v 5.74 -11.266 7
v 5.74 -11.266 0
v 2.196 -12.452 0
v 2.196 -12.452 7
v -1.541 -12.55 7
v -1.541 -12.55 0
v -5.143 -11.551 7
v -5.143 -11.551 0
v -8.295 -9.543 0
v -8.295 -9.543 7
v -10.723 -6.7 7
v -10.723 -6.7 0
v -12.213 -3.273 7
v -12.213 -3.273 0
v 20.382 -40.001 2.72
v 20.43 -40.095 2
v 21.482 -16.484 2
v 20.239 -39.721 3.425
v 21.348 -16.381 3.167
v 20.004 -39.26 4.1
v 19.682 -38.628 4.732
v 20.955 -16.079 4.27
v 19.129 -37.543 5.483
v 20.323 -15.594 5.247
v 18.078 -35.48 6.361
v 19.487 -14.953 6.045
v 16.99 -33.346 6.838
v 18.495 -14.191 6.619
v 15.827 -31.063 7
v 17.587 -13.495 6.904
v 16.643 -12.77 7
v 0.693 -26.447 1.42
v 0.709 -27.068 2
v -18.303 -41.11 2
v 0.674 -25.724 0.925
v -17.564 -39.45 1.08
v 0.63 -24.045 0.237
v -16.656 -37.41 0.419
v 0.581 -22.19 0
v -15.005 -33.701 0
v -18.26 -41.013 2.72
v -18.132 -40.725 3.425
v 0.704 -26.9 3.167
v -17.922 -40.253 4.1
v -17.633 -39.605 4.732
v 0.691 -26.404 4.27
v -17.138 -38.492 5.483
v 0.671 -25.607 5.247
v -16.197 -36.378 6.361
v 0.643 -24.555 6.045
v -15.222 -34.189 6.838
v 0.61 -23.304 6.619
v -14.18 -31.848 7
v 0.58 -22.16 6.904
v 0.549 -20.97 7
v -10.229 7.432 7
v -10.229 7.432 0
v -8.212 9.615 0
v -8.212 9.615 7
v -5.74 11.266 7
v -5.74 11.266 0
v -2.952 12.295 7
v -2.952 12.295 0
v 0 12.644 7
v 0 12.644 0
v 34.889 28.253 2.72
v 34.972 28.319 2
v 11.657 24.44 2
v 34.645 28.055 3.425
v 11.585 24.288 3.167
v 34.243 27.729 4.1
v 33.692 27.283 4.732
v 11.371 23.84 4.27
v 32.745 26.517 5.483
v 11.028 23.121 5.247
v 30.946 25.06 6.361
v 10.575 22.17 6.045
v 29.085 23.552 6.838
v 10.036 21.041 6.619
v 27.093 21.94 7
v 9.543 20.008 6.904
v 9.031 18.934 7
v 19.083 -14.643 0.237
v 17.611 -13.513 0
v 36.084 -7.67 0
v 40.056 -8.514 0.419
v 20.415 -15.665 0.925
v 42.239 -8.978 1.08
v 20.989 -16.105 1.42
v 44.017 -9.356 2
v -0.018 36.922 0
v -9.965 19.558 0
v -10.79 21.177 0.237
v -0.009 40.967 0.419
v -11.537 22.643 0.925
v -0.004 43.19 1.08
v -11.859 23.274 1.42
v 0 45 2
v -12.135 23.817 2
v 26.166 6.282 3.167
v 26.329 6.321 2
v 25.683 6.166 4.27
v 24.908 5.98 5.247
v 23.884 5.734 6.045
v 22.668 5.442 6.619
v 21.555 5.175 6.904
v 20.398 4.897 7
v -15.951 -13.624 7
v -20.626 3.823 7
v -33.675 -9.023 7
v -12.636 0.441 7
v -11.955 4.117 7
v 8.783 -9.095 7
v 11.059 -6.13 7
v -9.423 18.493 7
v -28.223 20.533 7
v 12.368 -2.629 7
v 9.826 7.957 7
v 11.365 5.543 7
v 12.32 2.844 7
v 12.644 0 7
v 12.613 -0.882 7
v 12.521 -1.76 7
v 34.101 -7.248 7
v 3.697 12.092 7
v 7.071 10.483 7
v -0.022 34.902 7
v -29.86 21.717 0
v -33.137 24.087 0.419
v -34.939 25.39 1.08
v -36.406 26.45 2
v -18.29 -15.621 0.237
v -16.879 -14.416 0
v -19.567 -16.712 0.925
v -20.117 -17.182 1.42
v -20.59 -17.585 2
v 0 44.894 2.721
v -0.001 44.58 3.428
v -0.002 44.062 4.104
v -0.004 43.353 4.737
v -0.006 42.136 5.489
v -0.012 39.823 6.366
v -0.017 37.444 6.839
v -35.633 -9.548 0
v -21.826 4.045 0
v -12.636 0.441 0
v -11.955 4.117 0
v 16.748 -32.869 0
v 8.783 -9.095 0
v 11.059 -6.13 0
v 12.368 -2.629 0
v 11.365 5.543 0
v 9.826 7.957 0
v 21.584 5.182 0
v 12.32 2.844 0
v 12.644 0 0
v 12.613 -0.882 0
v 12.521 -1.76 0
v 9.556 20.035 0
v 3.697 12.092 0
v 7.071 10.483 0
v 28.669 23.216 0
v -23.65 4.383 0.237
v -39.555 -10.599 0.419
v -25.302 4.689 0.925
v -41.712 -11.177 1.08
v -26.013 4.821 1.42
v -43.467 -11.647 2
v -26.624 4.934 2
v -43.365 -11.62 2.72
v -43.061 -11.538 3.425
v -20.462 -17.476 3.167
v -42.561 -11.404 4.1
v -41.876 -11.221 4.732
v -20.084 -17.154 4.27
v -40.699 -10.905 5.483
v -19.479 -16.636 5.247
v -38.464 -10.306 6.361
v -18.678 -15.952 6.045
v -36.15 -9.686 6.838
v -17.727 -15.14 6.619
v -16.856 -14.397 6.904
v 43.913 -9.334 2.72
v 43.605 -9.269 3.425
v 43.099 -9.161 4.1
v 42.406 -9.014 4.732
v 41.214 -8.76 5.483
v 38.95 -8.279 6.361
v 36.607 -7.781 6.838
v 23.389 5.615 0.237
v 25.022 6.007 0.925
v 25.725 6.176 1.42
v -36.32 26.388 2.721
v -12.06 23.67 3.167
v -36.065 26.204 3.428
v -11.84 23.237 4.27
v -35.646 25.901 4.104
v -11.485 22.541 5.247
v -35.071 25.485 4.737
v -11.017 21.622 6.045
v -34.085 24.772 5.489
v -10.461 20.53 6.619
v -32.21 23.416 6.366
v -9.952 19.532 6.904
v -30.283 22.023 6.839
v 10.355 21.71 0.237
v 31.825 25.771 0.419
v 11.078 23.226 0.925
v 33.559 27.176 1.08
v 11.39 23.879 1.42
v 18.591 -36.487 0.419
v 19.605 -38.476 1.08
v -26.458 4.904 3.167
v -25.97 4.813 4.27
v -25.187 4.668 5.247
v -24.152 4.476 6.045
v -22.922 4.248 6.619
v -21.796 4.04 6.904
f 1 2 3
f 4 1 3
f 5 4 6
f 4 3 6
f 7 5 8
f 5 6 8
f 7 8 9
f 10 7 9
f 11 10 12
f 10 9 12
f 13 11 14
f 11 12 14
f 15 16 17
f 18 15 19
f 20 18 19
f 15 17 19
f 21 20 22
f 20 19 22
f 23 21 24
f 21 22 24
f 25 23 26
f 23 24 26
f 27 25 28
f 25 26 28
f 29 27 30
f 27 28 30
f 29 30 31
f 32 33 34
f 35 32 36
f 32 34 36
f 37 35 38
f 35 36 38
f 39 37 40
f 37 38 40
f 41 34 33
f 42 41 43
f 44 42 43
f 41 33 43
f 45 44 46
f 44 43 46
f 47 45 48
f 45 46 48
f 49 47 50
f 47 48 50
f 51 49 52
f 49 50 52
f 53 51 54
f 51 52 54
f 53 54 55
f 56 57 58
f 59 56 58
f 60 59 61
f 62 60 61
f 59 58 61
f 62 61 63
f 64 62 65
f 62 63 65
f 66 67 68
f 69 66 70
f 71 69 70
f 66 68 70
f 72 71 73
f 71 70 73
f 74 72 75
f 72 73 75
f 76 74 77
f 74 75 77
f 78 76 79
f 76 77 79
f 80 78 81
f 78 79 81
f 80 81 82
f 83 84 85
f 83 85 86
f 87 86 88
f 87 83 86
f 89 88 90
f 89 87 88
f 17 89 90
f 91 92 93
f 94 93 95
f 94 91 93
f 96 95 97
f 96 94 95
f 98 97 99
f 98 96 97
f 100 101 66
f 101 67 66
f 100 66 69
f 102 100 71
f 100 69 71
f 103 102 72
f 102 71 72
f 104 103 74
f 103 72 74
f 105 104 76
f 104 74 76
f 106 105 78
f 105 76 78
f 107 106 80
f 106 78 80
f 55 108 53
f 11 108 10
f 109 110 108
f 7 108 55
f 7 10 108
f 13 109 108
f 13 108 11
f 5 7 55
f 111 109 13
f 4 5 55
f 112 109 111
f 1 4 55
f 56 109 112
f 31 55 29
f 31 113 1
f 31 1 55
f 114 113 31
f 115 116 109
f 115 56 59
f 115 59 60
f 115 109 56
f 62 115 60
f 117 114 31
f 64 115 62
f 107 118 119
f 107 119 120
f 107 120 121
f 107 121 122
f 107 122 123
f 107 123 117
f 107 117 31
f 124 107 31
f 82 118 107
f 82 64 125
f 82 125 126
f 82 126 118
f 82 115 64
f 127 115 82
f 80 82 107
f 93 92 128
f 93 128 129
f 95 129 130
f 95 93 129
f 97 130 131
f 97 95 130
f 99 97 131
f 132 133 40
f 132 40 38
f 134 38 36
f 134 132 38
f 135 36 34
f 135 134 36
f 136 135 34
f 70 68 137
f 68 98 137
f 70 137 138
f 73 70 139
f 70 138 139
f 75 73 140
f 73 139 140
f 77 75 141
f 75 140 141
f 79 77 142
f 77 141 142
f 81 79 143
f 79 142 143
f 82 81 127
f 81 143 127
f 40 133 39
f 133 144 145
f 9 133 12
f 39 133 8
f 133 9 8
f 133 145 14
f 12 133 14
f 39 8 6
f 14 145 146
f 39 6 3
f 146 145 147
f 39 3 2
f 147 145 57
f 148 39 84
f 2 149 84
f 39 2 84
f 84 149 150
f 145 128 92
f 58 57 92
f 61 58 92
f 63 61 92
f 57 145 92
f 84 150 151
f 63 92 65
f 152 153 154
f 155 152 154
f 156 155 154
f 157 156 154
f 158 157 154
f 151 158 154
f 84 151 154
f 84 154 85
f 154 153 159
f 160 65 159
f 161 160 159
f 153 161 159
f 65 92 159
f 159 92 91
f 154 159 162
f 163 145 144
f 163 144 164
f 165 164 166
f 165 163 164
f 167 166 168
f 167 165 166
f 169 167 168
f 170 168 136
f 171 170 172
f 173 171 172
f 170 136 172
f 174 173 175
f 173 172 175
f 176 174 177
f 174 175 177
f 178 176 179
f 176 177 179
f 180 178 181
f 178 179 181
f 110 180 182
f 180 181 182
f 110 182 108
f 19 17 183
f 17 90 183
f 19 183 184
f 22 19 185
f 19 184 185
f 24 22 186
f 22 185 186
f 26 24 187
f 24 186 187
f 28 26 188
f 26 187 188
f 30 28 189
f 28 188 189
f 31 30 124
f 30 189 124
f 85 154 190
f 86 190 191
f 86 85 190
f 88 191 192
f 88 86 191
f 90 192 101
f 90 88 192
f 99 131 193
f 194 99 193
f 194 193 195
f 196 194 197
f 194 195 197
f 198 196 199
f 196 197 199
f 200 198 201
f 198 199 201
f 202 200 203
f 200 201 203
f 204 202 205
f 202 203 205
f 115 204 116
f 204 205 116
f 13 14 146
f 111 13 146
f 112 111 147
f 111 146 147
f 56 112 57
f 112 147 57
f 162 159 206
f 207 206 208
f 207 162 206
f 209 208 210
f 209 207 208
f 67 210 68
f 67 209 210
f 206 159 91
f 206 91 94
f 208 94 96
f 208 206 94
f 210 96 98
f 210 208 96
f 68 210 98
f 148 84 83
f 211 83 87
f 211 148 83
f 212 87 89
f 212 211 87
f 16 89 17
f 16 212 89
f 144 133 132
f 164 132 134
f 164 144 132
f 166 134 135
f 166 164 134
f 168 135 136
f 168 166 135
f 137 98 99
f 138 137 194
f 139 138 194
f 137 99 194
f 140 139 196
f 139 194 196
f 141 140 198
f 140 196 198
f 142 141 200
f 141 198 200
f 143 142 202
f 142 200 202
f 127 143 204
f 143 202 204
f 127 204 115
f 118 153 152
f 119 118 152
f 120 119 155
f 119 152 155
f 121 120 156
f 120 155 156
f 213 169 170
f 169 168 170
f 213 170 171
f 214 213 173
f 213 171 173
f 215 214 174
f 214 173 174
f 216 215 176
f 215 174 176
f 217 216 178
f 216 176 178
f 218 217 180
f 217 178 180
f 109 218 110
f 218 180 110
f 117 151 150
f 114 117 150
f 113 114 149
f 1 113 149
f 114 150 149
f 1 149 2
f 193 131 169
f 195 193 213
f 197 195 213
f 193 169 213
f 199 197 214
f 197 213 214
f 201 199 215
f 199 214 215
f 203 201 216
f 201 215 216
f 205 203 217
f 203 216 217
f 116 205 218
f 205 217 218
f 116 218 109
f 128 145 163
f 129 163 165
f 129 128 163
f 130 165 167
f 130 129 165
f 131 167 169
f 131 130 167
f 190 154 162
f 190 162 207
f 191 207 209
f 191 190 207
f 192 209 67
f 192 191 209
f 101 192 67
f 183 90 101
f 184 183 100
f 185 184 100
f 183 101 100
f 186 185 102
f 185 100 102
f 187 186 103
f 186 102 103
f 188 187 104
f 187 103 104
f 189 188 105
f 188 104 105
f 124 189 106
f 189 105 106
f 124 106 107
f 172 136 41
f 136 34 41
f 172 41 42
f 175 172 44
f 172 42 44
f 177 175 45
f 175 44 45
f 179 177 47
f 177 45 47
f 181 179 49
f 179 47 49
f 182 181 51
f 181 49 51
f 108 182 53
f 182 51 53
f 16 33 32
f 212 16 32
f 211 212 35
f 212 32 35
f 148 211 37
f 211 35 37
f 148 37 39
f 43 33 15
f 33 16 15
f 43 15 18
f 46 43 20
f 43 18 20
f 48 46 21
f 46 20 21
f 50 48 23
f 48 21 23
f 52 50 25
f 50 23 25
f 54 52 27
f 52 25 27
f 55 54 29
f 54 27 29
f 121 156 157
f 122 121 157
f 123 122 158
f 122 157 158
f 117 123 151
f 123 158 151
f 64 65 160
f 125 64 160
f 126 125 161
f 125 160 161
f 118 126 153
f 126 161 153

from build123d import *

# Parameters (mm, degrees)
F1_DEPTH      = 7
F2_R          = 5
F3_T4_DEPTH   = 43.6349666374
F3_T9_DEPTH   = 43.6349666374
F3_T14_DEPTH  = 44.4129734555
F3_T19_DEPTH  = 44.4129734555
F3_T24_DEPTH  = 43.6349666396
F3_T29_DEPTH  = 43.6349666396
F3_T34_DEPTH  = 43.6349666396
F3_T39_DEPTH  = 43.6349666396
F3_T44_DEPTH  = 43.6349666396
F3_T49_DEPTH  = 43.6349666396
F3_T54_DEPTH  = 43.6349666396
F3_T59_DEPTH  = 43.6349666418
F3_T64_DEPTH  = 43.6349666418
F3_T69_DEPTH  = 43.6349666396
F3_T75_DEPTH  = 43.6349666374
F3_T79_DEPTH  = 43.6349666374
F3_T86_DEPTH  = 44.4129734555
F3_T90_DEPTH  = 44.4129734555
F3_T97_DEPTH  = 43.6349666396
F3_T101_DEPTH = 43.6349666396
F3_T108_DEPTH = 43.6349666396
F3_T112_DEPTH = 43.6349666396
F3_T119_DEPTH = 43.6349666396
F3_T123_DEPTH = 43.6349666396
F3_T130_DEPTH = 43.6349666396
F3_T134_DEPTH = 43.6349666396
F3_T141_DEPTH = 43.6349666418
F3_T145_DEPTH = 43.6349666418


# Not quite as in the source:
# - a fillet or chamfer that OpenCascade refuses, or shapes differently, is made with other operations: its cross-section is extruded or revolved along the edge and cut away or added


with BuildPart() as f1:
    # F0 (on Top) → F1 (new body)
    with BuildSketch(Plane.XY):
        Polygon((20.4295724883, -40.0952935885), (10.2147862441, -20.0476467942), (0.70880785, -27.0682797275), align=None)
        Polygon((-18.3031489384, -41.1095455939), (-9.1515744692, -20.554772797), (-20.5899370405, -17.5854675412), align=None)
        Polygon((-20.5899370405, -17.5854675412), (-21.7333310915, -5.8234285148), (-43.466662183, -11.6468570296), align=None)
        Polygon((-12.1352549156, 23.8167787844), (0, 22.5), (0, 45), align=None)
        Polygon((-43.466662183, -11.6468570296), (-21.7333310915, -5.8234285148), (-26.62414231, 4.9344931078), align=None)
        Polygon((21.4820715071, -16.4837732251), (10.2147862441, -20.0476467942), (20.4295724883, -40.0952935885), align=None)
        Polygon((-26.62414231, 4.9344931078), (-18.2028823734, 13.2251681766), (-36.4057647469, 26.4503363532), align=None)
        with BuildLine():
            Line((10.2147862441, -20.0476467942), (7.7328428868, -15.176558687))
            ThreePointArc((7.7328428868, -15.176558687), (0.4458732697, -17.0272132106), (-6.927965583, -15.5604654677))
            Line((-6.927965583, -15.5604654677), (-9.1515744692, -20.554772797))
            Line((-9.1515744692, -20.554772797), (10.2147862441, -20.0476467942))
        make_face()
        Polygon((0, 45), (0, 22.5), (11.6571894205, 24.4398058675), align=None)
        Polygon((0.70880785, -27.0682797275), (-9.1515744692, -20.554772797), (-18.3031489384, -41.1095455939), align=None)
        Polygon((-18.2028823734, 13.2251681766), (0, 22.5), (-12.1352549156, 23.8167787844), align=None)
        with BuildLine():
            Line((7.7328428868, -15.176558687), (5.7403470363, -11.2660653986))
            ThreePointArc((5.7403470363, -11.2660653986), (0.3309865905, -12.63986794), (-5.1428597844, -11.5510521989))
            Line((-5.1428597844, -11.5510521989), (-6.927965583, -15.5604654677))
            ThreePointArc((-6.927965583, -15.5604654677), (0.4458732697, -17.0272132106), (7.7328428868, -15.176558687))
        make_face()
        Polygon((34.9715682614, 28.3194176024), (17.4857841307, 14.1597088012), (26.3294034315, 6.3211305052), align=None)
        Polygon((11.6571894205, 24.4398058675), (17.4857841307, 14.1597088012), (34.9715682614, 28.3194176024), align=None)
        Polygon((0, 22.5), (17.4857841307, 14.1597088012), (11.6571894205, 24.4398058675), align=None)
        with BuildLine():
            Line((16.6608370018, -3.5413702277), (12.3678946677, -2.6288771657))
            ThreePointArc((12.3678946677, -2.6288771657), (10.0313189335, -7.6973017427), (5.7403470363, -11.2660653986))
            Line((5.7403470363, -11.2660653986), (7.7328428868, -15.176558687))
            ThreePointArc((7.7328428868, -15.176558687), (13.5132271219, -10.3690638653), (16.6608370018, -3.5413702277))
        make_face()
        Polygon((44.016642033, -9.3560260868), (22.0083210165, -4.6780130434), (21.4820715071, -16.4837732251), align=None)
        Polygon((-20.5899370405, -17.5854675412), (-9.1515744692, -20.554772797), (-21.7333310915, -5.8234285148), align=None)
        Polygon((26.3294034315, 6.3211305052), (22.0083210165, -4.6780130434), (44.016642033, -9.3560260868), align=None)
        with BuildLine():
            ThreePointArc((-12.2133600976, -3.272559975), (-12.4324724808, 2.3042225757), (-10.2293733208, 7.4320747524))
            Line((-10.2293733208, 7.4320747524), (-13.7800269253, 10.0117755983))
            ThreePointArc((-13.7800269253, 10.0117755983), (-16.7478300145, 3.1040268196), (-16.4526629065, -4.4084777391))
            Line((-16.4526629065, -4.4084777391), (-12.2133600976, -3.272559975))
        make_face()
        with BuildLine():
            ThreePointArc((-16.4526629065, -4.4084777391), (-16.7478300145, 3.1040268196), (-13.7800269253, 10.0117755983))
            Line((-13.7800269253, 10.0117755983), (-18.2028823734, 13.2251681766))
            Line((-18.2028823734, 13.2251681766), (-21.7333310915, -5.8234285148))
            Line((-21.7333310915, -5.8234285148), (-16.4526629065, -4.4084777391))
        make_face()
        Polygon((0.70880785, -27.0682797275), (10.2147862441, -20.0476467942), (-9.1515744692, -20.554772797), align=None)
        with BuildLine():
            ThreePointArc((0, 12.6442007918), (5.4434687503, 11.4124695674), (9.82638958, 7.9572533883))
            Line((9.82638958, 7.9572533883), (13.2371660261, 10.7192456959))
            ThreePointArc((13.2371660261, 10.7192456959), (7.3329170413, 15.3737802884), (0, 17.0330500114))
            Line((0, 17.0330500114), (0, 12.6442007918))
        make_face()
        Polygon((-36.4057647469, 26.4503363532), (-18.2028823734, 13.2251681766), (-12.1352549156, 23.8167787844), align=None)
        with BuildLine():
            Line((22.0083210165, -4.6780130434), (16.6608370018, -3.5413702277))
            ThreePointArc((16.6608370018, -3.5413702277), (13.5132271219, -10.3690638653), (7.7328428868, -15.176558687))
            Line((7.7328428868, -15.176558687), (10.2147862441, -20.0476467942))
            Line((10.2147862441, -20.0476467942), (22.0083210165, -4.6780130434))
        make_face()
        with BuildLine():
            ThreePointArc((-10.2293733208, 7.4320747524), (-5.7403470363, 11.2660653986), (0, 12.6442007918))
            Line((0, 12.6442007918), (0, 17.0330500114))
            ThreePointArc((0, 17.0330500114), (-7.7328428868, 15.176558687), (-13.7800269253, 10.0117755983))
            Line((-13.7800269253, 10.0117755983), (-10.2293733208, 7.4320747524))
        make_face()
        with BuildLine():
            ThreePointArc((-13.7800269253, 10.0117755983), (-7.7328428868, 15.176558687), (0, 17.0330500114))
            Line((0, 17.0330500114), (0, 22.5))
            Line((0, 22.5), (-18.2028823734, 13.2251681766))
            Line((-18.2028823734, 13.2251681766), (-13.7800269253, 10.0117755983))
        make_face()
        with BuildLine():
            ThreePointArc((9.82638958, 7.9572533883), (11.9189482877, 4.2207209547), (12.6442007918, 0))
            ThreePointArc((12.6442007918, 0), (12.5749345369, -1.321678878), (12.3678946677, -2.6288771657))
            Line((12.3678946677, -2.6288771657), (16.6608370018, -3.5413702277))
            ThreePointArc((16.6608370018, -3.5413702277), (16.9397411812, -1.7804385425), (17.0330500114, 0))
            ThreePointArc((17.0330500114, 0), (16.0560596602, 5.6857489287), (13.2371660261, 10.7192456959))
            Line((13.2371660261, 10.7192456959), (9.82638958, 7.9572533883))
        make_face()
        with BuildLine():
            Line((-9.1515744692, -20.554772797), (-6.927965583, -15.5604654677))
            ThreePointArc((-6.927965583, -15.5604654677), (-12.952032841, -11.062081087), (-16.4526629065, -4.4084777391))
            Line((-16.4526629065, -4.4084777391), (-21.7333310915, -5.8234285148))
            Line((-21.7333310915, -5.8234285148), (-9.1515744692, -20.554772797))
        make_face()
        Polygon((-21.7333310915, -5.8234285148), (-18.2028823734, 13.2251681766), (-26.62414231, 4.9344931078), align=None)
        with BuildLine():
            Line((-6.927965583, -15.5604654677), (-5.1428597844, -11.5510521989))
            ThreePointArc((-5.1428597844, -11.5510521989), (-9.6147257123, -8.2117515269), (-12.2133600976, -3.272559975))
            Line((-12.2133600976, -3.272559975), (-16.4526629065, -4.4084777391))
            ThreePointArc((-16.4526629065, -4.4084777391), (-12.952032841, -11.062081087), (-6.927965583, -15.5604654677))
        make_face()
        with BuildLine():
            Line((17.4857841307, 14.1597088012), (13.2371660261, 10.7192456959))
            ThreePointArc((13.2371660261, 10.7192456959), (16.0560596602, 5.6857489287), (17.0330500114, 0))
            ThreePointArc((17.0330500114, 0), (16.9397411812, -1.7804385425), (16.6608370018, -3.5413702277))
            Line((16.6608370018, -3.5413702277), (22.0083210165, -4.6780130434))
            Line((22.0083210165, -4.6780130434), (17.4857841307, 14.1597088012))
        make_face()
        Polygon((21.4820715071, -16.4837732251), (22.0083210165, -4.6780130434), (10.2147862441, -20.0476467942), align=None)
        Polygon((26.3294034315, 6.3211305052), (17.4857841307, 14.1597088012), (22.0083210165, -4.6780130434), align=None)
        with BuildLine():
            ThreePointArc((0, 17.0330500114), (7.3329170413, 15.3737802884), (13.2371660261, 10.7192456959))
            Line((13.2371660261, 10.7192456959), (17.4857841307, 14.1597088012))
            Line((17.4857841307, 14.1597088012), (0, 22.5))
            Line((0, 22.5), (0, 17.0330500114))
        make_face()
    extrude(amount=F1_DEPTH)

    # F2
    f2_edges = [f1.edges().sort_by_distance(p)[0] for p in [
        (-24.27051, 25.133558, 7),
        (-6.067627, 34.408389, 7),
        (5.828595, 34.719903, 7),
        (23.314379, 26.379612, 7),
        (35.173023, -1.517448, 7),
        (32.749357, -12.9199, 7),
        (20.955822, -28.289533, 7),
        (10.56919, -33.581787, 7),
        (-8.797171, -34.088913, 7),
        (-19.446543, -29.347507, 7),
        (-32.0283, -14.616162, 7),
        (-35.045402, -3.356182, 7),
        (-31.514954, 15.692415, 7),
        (30.650486, 17.320274, 7),
    ]]
    fillet(f2_edges, radius=F2_R)

    # F3: fillet of radius 5 on 14 edges, made by hand


with BuildPart() as f3_tool2:
    # F3_s3 → F3_t4 (new body)
    with BuildSketch(Plane(origin=(48.4791406288, 8.0671350572, 0), x_dir=(0, 0, 1), z_dir=(-0.9864358685, -0.1641471213, 0))):
        with BuildLine():
            ThreePointArc((0, 18.1948070403), (0.527864045, 20.4308750178), (2, 22.1948070403))
            Line((2, 22.1948070403), (1.94, 22.2748070403))
            ThreePointArc((1.94, 22.2748070403), (1, 22.2948070403), (0, 22.2948070403))
            Line((0, 22.2948070403), (-0.1, 22.1948070403))
            Line((-0.1, 22.1948070403), (-0.1, 18.1948070403))
            Line((-0.1, 18.1948070403), (0, 18.1948070403))
        make_face()
    extrude(amount=F3_T4_DEPTH)

    split(bisect_by=Plane(origin=(19.3073909721, 10.946876879, 0), x_dir=(0, 0, 1), z_dir=(0.8699057819, 0.4932179342, 0)), keep=Keep.TOP)


with BuildPart() as f1_1:
    add(f1.part)

    # F3_t1: cut F3_tool2
    add(f3_tool2.part, mode=Mode.SUBTRACT)


with BuildPart() as f3_tool7:
    # F3_s8 → F3_t9 (new body)
    with BuildSketch(Plane(origin=(-2.7180222094, 4.7938711696, 0), x_dir=(0, 0, 1), z_dir=(-0.4932179342, 0.8699057819, 0))):
        with BuildLine():
            ThreePointArc((0, 18.1948070403), (0.527864045, 20.4308750178), (2, 22.1948070403))
            Line((2, 22.1948070403), (1.94, 22.2748070403))
            ThreePointArc((1.94, 22.2748070403), (1, 22.2948070403), (0, 22.2948070403))
            Line((0, 22.2948070403), (-0.1, 22.1948070403))
            Line((-0.1, 22.1948070403), (-0.1, 18.1948070403))
            Line((-0.1, 18.1948070403), (0, 18.1948070403))
        make_face()
    extrude(amount=F3_T9_DEPTH)

    split(bisect_by=Plane(origin=(-3.6432136829, 21.893753758, 0), x_dir=(0, 0, 1), z_dir=(-0.1641471213, 0.9864358685, 0)), keep=Keep.TOP)


with BuildPart() as f1_2:
    add(f1_1.part)

    # F3_t6: cut F3_tool7
    add(f3_tool7.part, mode=Mode.SUBTRACT)


with BuildPart() as f3_tool12:
    # F3_s13 → F3_t14 (new body)
    with BuildSketch(Plane(origin=(24.3802199512, 42.5579516955, 0), x_dir=(0, 0, 1), z_dir=(-0.4970822148, -0.8677034469, 0))):
        with BuildLine():
            ThreePointArc((0, 18.368699667), (0.527864045, 20.6047676445), (2, 22.368699667))
            Line((2, 22.368699667), (1.94, 22.448699667))
            ThreePointArc((1.94, 22.448699667), (1, 22.468699667), (0, 22.468699667))
            Line((0, 22.468699667), (-0.1, 22.368699667))
            Line((-0.1, 22.368699667), (-0.1, 18.368699667))
            Line((-0.1, 18.368699667), (0, 18.368699667))
        make_face()
    extrude(amount=F3_T14_DEPTH)

    split(bisect_by=Plane(origin=(2.4130308591, 22.2381655463, 0), x_dir=(0, 0, 1), z_dir=(0.10787533, 0.9941644296, 0)), keep=Keep.TOP)


with BuildPart() as f1_3:
    add(f1_2.part)

    # F3_t11: cut F3_tool12
    add(f3_tool12.part, mode=Mode.SUBTRACT)


with BuildPart() as f3_tool17:
    # F3_s18 → F3_t19 (new body)
    with BuildSketch(Plane(origin=(-4.6066414783, 0.4998599377, 0), x_dir=(0, 0, 1), z_dir=(-0.9941644296, 0.10787533, 0))):
        with BuildLine():
            ThreePointArc((0, 18.368699667), (0.527864045, 20.6047676445), (2, 22.368699667))
            Line((2, 22.368699667), (1.94, 22.448699667))
            ThreePointArc((1.94, 22.448699667), (1, 22.468699667), (0, 22.468699667))
            Line((0, 22.468699667), (-0.1, 22.368699667))
            Line((-0.1, 22.368699667), (-0.1, 18.368699667))
            Line((-0.1, 18.368699667), (0, 18.368699667))
        make_face()
    extrude(amount=F3_T19_DEPTH)

    split(bisect_by=Plane(origin=(-19.409397803, 11.1190827731, 0), x_dir=(0, 0, 1), z_dir=(-0.8677034469, 0.4970822148, 0)), keep=Keep.TOP)


with BuildPart() as f1_4:
    add(f1_3.part)

    # F3_t16: cut F3_tool17
    add(f3_tool17.part, mode=Mode.SUBTRACT)


with BuildPart() as f3_tool22:
    # F3_s23 → F3_t24 (new body)
    with BuildSketch(Plane(origin=(-20.3395789734, 44.7393257805, 0), x_dir=(0, 0, 1), z_dir=(0.4138623331, -0.9103394802, 0))):
        with BuildLine():
            ThreePointArc((0, 18.1948070409), (0.527864045, 20.4308750184), (2, 22.1948070409))
            Line((2, 22.1948070409), (1.94, 22.2748070409))
            ThreePointArc((1.94, 22.2748070409), (1, 22.2948070409), (0, 22.2948070409))
            Line((0, 22.2948070409), (-0.1, 22.1948070409))
            Line((-0.1, 22.1948070409), (-0.1, 18.1948070409))
            Line((-0.1, 18.1948070409), (0, 18.1948070409))
        make_face()
    extrude(amount=F3_T24_DEPTH)

    split(bisect_by=Plane(origin=(-15.5709915901, 15.8162473578, 0), x_dir=(0, 0, 1), z_dir=(-0.7015601245, 0.7126102664, 0)), keep=Keep.TOP)


with BuildPart() as f1_5:
    add(f1_4.part)

    # F3_t21: cut F3_tool22
    add(f3_tool22.part, mode=Mode.SUBTRACT)


with BuildPart() as f3_tool27:
    # F3_s28 → F3_t29 (new body)
    with BuildSketch(Plane(origin=(-3.927048056, -3.8661530052, 0), x_dir=(0, 0, 1), z_dir=(-0.7126102664, -0.7015601245, 0))):
        with BuildLine():
            ThreePointArc((0, 18.1948070409), (0.527864045, 20.4308750184), (2, 22.1948070409))
            Line((2, 22.1948070409), (1.94, 22.2748070409))
            ThreePointArc((1.94, 22.2748070409), (1, 22.2948070409), (0, 22.2948070409))
            Line((0, 22.2948070409), (-0.1, 22.1948070409))
            Line((-0.1, 22.1948070409), (-0.1, 18.1948070409))
            Line((-0.1, 18.1948070409), (0, 18.1948070409))
        make_face()
    extrude(amount=F3_T29_DEPTH)

    split(bisect_by=Plane(origin=(-20.2048091048, -9.1855946253, 0), x_dir=(0, 0, 1), z_dir=(-0.9103394802, -0.4138623331, 0)), keep=Keep.TOP)


with BuildPart() as f1_6:
    add(f1_5.part)

    # F3_t26: cut F3_tool27
    add(f3_tool27.part, mode=Mode.SUBTRACT)


with BuildPart() as f3_tool32:
    # F3_s33 → F3_t34 (new body)
    with BuildSketch(Plane(origin=(-47.5690981419, 12.3485483386, 0), x_dir=(0, 0, 1), z_dir=(0.9679186559, -0.2512637569, 0))):
        with BuildLine():
            ThreePointArc((0, 18.1948070409), (0.527864045, 20.4308750184), (2, 22.1948070409))
            Line((2, 22.1948070409), (1.94, 22.2748070409))
            ThreePointArc((1.94, 22.2748070409), (1, 22.2948070409), (0, 22.2948070409))
            Line((0, 22.2948070409), (-0.1, 22.1948070409))
            Line((-0.1, 22.1948070409), (-0.1, 18.1948070409))
            Line((-0.1, 18.1948070409), (0, 18.1948070409))
        make_face()
    extrude(amount=F3_T34_DEPTH)

    split(bisect_by=Plane(origin=(-22.090675276, -2.147446258, 0), x_dir=(0, 0, 1), z_dir=(-0.9953082825, -0.0967544459, 0)), keep=Keep.TOP)


with BuildPart() as f1_7:
    add(f1_6.part)

    # F3_t31: cut F3_tool32
    add(f3_tool32.part, mode=Mode.SUBTRACT)


with BuildPart() as f3_tool37:
    # F3_s38 → F3_t39 (new body)
    with BuildSketch(Plane(origin=(0.5331937761, -5.4849384583, 0), x_dir=(0, 0, 1), z_dir=(0.0967544459, -0.9953082825, 0))):
        with BuildLine():
            ThreePointArc((0, 18.1948070409), (0.527864045, 20.4308750184), (2, 22.1948070409))
            Line((2, 22.1948070409), (1.94, 22.2748070409))
            ThreePointArc((1.94, 22.2748070409), (1, 22.2948070409), (0, 22.2948070409))
            Line((0, 22.2948070409), (-0.1, 22.1948070409))
            Line((-0.1, 22.1948070409), (-0.1, 18.1948070409))
            Line((-0.1, 18.1948070409), (0, 18.1948070409))
        make_face()
    extrude(amount=F3_T39_DEPTH)

    split(bisect_by=Plane(origin=(-5.5767506003, -21.4827677994, 0), x_dir=(0, 0, 1), z_dir=(-0.2512637569, -0.9679186559, 0)), keep=Keep.TOP)


with BuildPart() as f1_8:
    add(f1_7.part)

    # F3_t36: cut F3_tool37
    add(f3_tool37.part, mode=Mode.SUBTRACT)


with BuildPart() as f3_tool42:
    # F3_s43 → F3_t44 (new body)
    with BuildSketch(Plane(origin=(-39.5328279158, -29.1969392418, 0), x_dir=(0, 0, 1), z_dir=(0.804399561, 0.5940886687, 0))):
        with BuildLine():
            ThreePointArc((2, 22.1948070409), (0.527864045, 20.4308750184), (0, 18.1948070409))
            Line((0, 18.1948070409), (-0.1, 18.1948070409))
            Line((-0.1, 18.1948070409), (-0.1, 22.1948070409))
            Line((-0.1, 22.1948070409), (0, 22.2948070409))
            ThreePointArc((0, 22.2948070409), (1, 22.2948070409), (1.94, 22.2748070409))
            Line((1.94, 22.2748070409), (2, 22.1948070409))
        make_face()
    extrude(amount=F3_T44_DEPTH)

    split(bisect_by=Plane(origin=(-12.2332332164, -18.5191107955, 0), x_dir=(0, 0, 1), z_dir=(-0.5511754706, -0.8343893579, 0)), keep=Keep.TOP)


with BuildPart() as f1_9:
    add(f1_8.part)

    # F3_t41: cut F3_tool42
    add(f3_tool42.part, mode=Mode.SUBTRACT)


with BuildPart() as f3_tool47:
    # F3_s48 → F3_t49 (new body)
    with BuildSketch(Plane(origin=(4.5981474874, -3.0374142256, 0), x_dir=(0, 0, 1), z_dir=(0.8343893579, -0.5511754706, 0))):
        with BuildLine():
            ThreePointArc((2, 22.1948070409), (0.527864045, 20.4308750184), (0, 18.1948070409))
            Line((0, 18.1948070409), (-0.1, 18.1948070409))
            Line((-0.1, 18.1948070409), (-0.1, 22.1948070409))
            Line((-0.1, 22.1948070409), (0, 22.2948070409))
            ThreePointArc((0, 22.2948070409), (1, 22.2948070409), (1.94, 22.2748070409))
            Line((1.94, 22.2748070409), (2, 22.1948070409))
        make_face()
    extrude(amount=F3_T49_DEPTH)

    split(bisect_by=Plane(origin=(13.1856833677, -17.8534930394, 0), x_dir=(0, 0, 1), z_dir=(0.5940886687, -0.804399561, 0)), keep=Keep.TOP)


with BuildPart() as f1_10:
    add(f1_9.part)

    # F3_t46: cut F3_tool47
    add(f3_tool47.part, mode=Mode.SUBTRACT)


with BuildPart() as f3_tool52:
    # F3_s53 → F3_t54 (new body)
    with BuildSketch(Plane(origin=(5.2542221736, 1.6619250417, 0), x_dir=(0, 0, 1), z_dir=(0.9534420281, 0.3015763571, 0))):
        with BuildLine():
            ThreePointArc((0, 18.1948070409), (0.527864045, 20.4308750184), (2, 22.1948070409))
            Line((2, 22.1948070409), (1.94, 22.2748070409))
            ThreePointArc((1.94, 22.2748070409), (1, 22.2948070409), (0, 22.2948070409))
            Line((0, 22.2948070409), (-0.1, 22.1948070409))
            Line((-0.1, 22.1948070409), (-0.1, 18.1948070409))
            Line((-0.1, 18.1948070409), (0, 18.1948070409))
        make_face()
    extrude(amount=F3_T54_DEPTH)

    split(bisect_by=Plane(origin=(22.1727894267, -0.9883666429, 0), x_dir=(0, 0, 1), z_dir=(0.9990079835, -0.0445314366, 0)), keep=Keep.TOP)


with BuildPart() as f1_11:
    add(f1_10.part)

    # F3_t51: cut F3_tool52
    add(f3_tool52.part, mode=Mode.SUBTRACT)


with BuildPart() as f3_tool57:
    # F3_s58 → F3_t59 (new body)
    with BuildSketch(Plane(origin=(36.7782531622, -32.5985557719, 0), x_dir=(0, 0, 1), z_dir=(-0.7483504787, 0.663303521, 0))):
        with BuildLine():
            ThreePointArc((0, 18.1948070415), (0.527864045, 20.430875019), (2, 22.1948070415))
            Line((2, 22.1948070415), (1.94, 22.2748070415))
            ThreePointArc((1.94, 22.2748070415), (1, 22.2948070415), (0, 22.2948070415))
            Line((0, 22.2948070415), (-0.1, 22.1948070415))
            Line((-0.1, 22.1948070415), (-0.1, 18.1948070415))
            Line((-0.1, 18.1948070415), (0, 18.1948070415))
        make_face()
    extrude(amount=F3_T59_DEPTH)

    split(bisect_by=Plane(origin=(20.6578559964, -8.1155680787, 0), x_dir=(0, 0, 1), z_dir=(0.9307517726, -0.3656516618, 0)), keep=Keep.TOP)


with BuildPart() as f1_12:
    add(f1_11.part)

    # F3_t56: cut F3_tool57
    add(f3_tool57.part, mode=Mode.SUBTRACT)


with BuildPart() as f3_tool62:
    # F3_s63 → F3_t64 (new body)
    with BuildSketch(Plane(origin=(2.0150308168, 5.1291808579, 0), x_dir=(0, 0, 1), z_dir=(0.3656516618, 0.9307517726, 0))):
        with BuildLine():
            ThreePointArc((0, 18.1948070415), (0.527864045, 20.430875019), (2, 22.1948070415))
            Line((2, 22.1948070415), (1.94, 22.2748070415))
            ThreePointArc((1.94, 22.2748070415), (1, 22.2948070415), (0, 22.2948070415))
            Line((0, 22.2948070415), (-0.1, 22.1948070415))
            Line((-0.1, 22.1948070415), (-0.1, 18.1948070415))
            Line((-0.1, 18.1948070415), (0, 18.1948070415))
        make_face()
    extrude(amount=F3_T64_DEPTH)

    split(bisect_by=Plane(origin=(14.7218936583, 16.6094944752, 0), x_dir=(0, 0, 1), z_dir=(0.663303521, 0.7483504787, 0)), keep=Keep.TOP)


with BuildPart() as f1_13:
    add(f1_12.part)

    # F3_t61: cut F3_tool62
    add(f3_tool62.part, mode=Mode.SUBTRACT)


with BuildPart() as f3_tool67:
    # F3_s68 → F3_t69 (new body)
    with BuildSketch(Plane(origin=(-2.1885313046, -49.0970067808, 0), x_dir=(0, 0, 1), z_dir=(0.0445314366, 0.9990079835, 0))):
        with BuildLine():
            ThreePointArc((0, 18.1948070409), (0.527864045, 20.4308750184), (2, 22.1948070409))
            Line((2, 22.1948070409), (1.94, 22.2748070409))
            ThreePointArc((1.94, 22.2748070409), (1, 22.2948070409), (0, 22.2948070409))
            Line((0, 22.2948070409), (-0.1, 22.1948070409))
            Line((-0.1, 22.1948070409), (-0.1, 18.1948070409))
            Line((-0.1, 18.1948070409), (0, 18.1948070409))
        make_face()
    extrude(amount=F3_T69_DEPTH)

    split(bisect_by=Plane(origin=(6.6934290529, -21.1614618374, 0), x_dir=(0, 0, 1), z_dir=(0.3015763571, -0.9534420281, 0)), keep=Keep.TOP)


with BuildPart() as f1_14:
    add(f1_13.part)

    # F3_t66: cut F3_tool67
    add(f3_tool67.part, mode=Mode.SUBTRACT)


with BuildPart() as f3_tool73:
    # F3_s74 → F3_t75 (new body)
    with BuildSketch(Plane(origin=(48.4791406288, 8.0671350572, 0), x_dir=(0, 0, 1), z_dir=(-0.9864358685, -0.1641471213, 0))):
        with BuildLine():
            ThreePointArc((0, 18.1948070403), (0.527864045, 20.4308750178), (2, 22.1948070403))
            Line((2, 22.1948070403), (1.94, 22.2748070403))
            ThreePointArc((1.94, 22.2748070403), (1, 22.2948070403), (0, 22.2948070403))
            Line((0, 22.2948070403), (-0.1, 22.1948070403))
            Line((-0.1, 22.1948070403), (-0.1, 18.1948070403))
            Line((-0.1, 18.1948070403), (0, 18.1948070403))
        make_face()
    extrude(amount=F3_T75_DEPTH)

    split(bisect_by=Plane(origin=(19.3073909721, 10.946876879, 0), x_dir=(0, 0, 1), z_dir=(-0.8699057819, -0.4932179342, 0)), keep=Keep.TOP)


with BuildPart() as f3_tool77:
    # F3_s78 → F3_t79 (new body)
    with BuildSketch(Plane(origin=(-2.7180222094, 4.7938711696, 0), x_dir=(0, 0, 1), z_dir=(-0.4932179342, 0.8699057819, 0))):
        with BuildLine():
            ThreePointArc((0, 18.1948070403), (0.527864045, 20.4308750178), (2, 22.1948070403))
            Line((2, 22.1948070403), (1.94, 22.2748070403))
            ThreePointArc((1.94, 22.2748070403), (1, 22.2948070403), (0, 22.2948070403))
            Line((0, 22.2948070403), (-0.1, 22.1948070403))
            Line((-0.1, 22.1948070403), (-0.1, 18.1948070403))
            Line((-0.1, 18.1948070403), (0, 18.1948070403))
        make_face()
    extrude(amount=F3_T79_DEPTH)

    split(bisect_by=Plane(origin=(-3.6432136829, 21.893753758, 0), x_dir=(0, 0, 1), z_dir=(0.1641471213, -0.9864358685, 0)), keep=Keep.TOP)


with BuildPart() as f3_tool73_1:
    add(f3_tool73.part)

    # F3_t81: intersect F3_tool77
    add(f3_tool77.part, mode=Mode.INTERSECT)


with BuildPart() as f1_15:
    add(f1_14.part)

    # F3_t71: cut F3_tool73
    add(f3_tool73_1.part, mode=Mode.SUBTRACT)


with BuildPart() as f3_tool84:
    # F3_s85 → F3_t86 (new body)
    with BuildSketch(Plane(origin=(24.3802199512, 42.5579516955, 0), x_dir=(0, 0, 1), z_dir=(-0.4970822148, -0.8677034469, 0))):
        with BuildLine():
            ThreePointArc((0, 18.368699667), (0.527864045, 20.6047676445), (2, 22.368699667))
            Line((2, 22.368699667), (1.94, 22.448699667))
            ThreePointArc((1.94, 22.448699667), (1, 22.468699667), (0, 22.468699667))
            Line((0, 22.468699667), (-0.1, 22.368699667))
            Line((-0.1, 22.368699667), (-0.1, 18.368699667))
            Line((-0.1, 18.368699667), (0, 18.368699667))
        make_face()
    extrude(amount=F3_T86_DEPTH)

    split(bisect_by=Plane(origin=(2.4130308591, 22.2381655463, 0), x_dir=(0, 0, 1), z_dir=(-0.10787533, -0.9941644296, 0)), keep=Keep.TOP)


with BuildPart() as f3_tool88:
    # F3_s89 → F3_t90 (new body)
    with BuildSketch(Plane(origin=(-4.6066414783, 0.4998599377, 0), x_dir=(0, 0, 1), z_dir=(-0.9941644296, 0.10787533, 0))):
        with BuildLine():
            ThreePointArc((0, 18.368699667), (0.527864045, 20.6047676445), (2, 22.368699667))
            Line((2, 22.368699667), (1.94, 22.448699667))
            ThreePointArc((1.94, 22.448699667), (1, 22.468699667), (0, 22.468699667))
            Line((0, 22.468699667), (-0.1, 22.368699667))
            Line((-0.1, 22.368699667), (-0.1, 18.368699667))
            Line((-0.1, 18.368699667), (0, 18.368699667))
        make_face()
    extrude(amount=F3_T90_DEPTH)

    split(bisect_by=Plane(origin=(-19.409397803, 11.1190827731, 0), x_dir=(0, 0, 1), z_dir=(0.8677034469, -0.4970822148, 0)), keep=Keep.TOP)


with BuildPart() as f3_tool84_1:
    add(f3_tool84.part)

    # F3_t92: intersect F3_tool88
    add(f3_tool88.part, mode=Mode.INTERSECT)


with BuildPart() as f1_16:
    add(f1_15.part)

    # F3_t82: cut F3_tool84
    add(f3_tool84_1.part, mode=Mode.SUBTRACT)


with BuildPart() as f3_tool95:
    # F3_s96 → F3_t97 (new body)
    with BuildSketch(Plane(origin=(-20.3395789734, 44.7393257805, 0), x_dir=(0, 0, 1), z_dir=(0.4138623331, -0.9103394802, 0))):
        with BuildLine():
            ThreePointArc((0, 18.1948070409), (0.527864045, 20.4308750184), (2, 22.1948070409))
            Line((2, 22.1948070409), (1.94, 22.2748070409))
            ThreePointArc((1.94, 22.2748070409), (1, 22.2948070409), (0, 22.2948070409))
            Line((0, 22.2948070409), (-0.1, 22.1948070409))
            Line((-0.1, 22.1948070409), (-0.1, 18.1948070409))
            Line((-0.1, 18.1948070409), (0, 18.1948070409))
        make_face()
    extrude(amount=F3_T97_DEPTH)

    split(bisect_by=Plane(origin=(-15.5709915901, 15.8162473578, 0), x_dir=(0, 0, 1), z_dir=(0.7015601245, -0.7126102664, 0)), keep=Keep.TOP)


with BuildPart() as f3_tool99:
    # F3_s100 → F3_t101 (new body)
    with BuildSketch(Plane(origin=(-3.927048056, -3.8661530052, 0), x_dir=(0, 0, 1), z_dir=(-0.7126102664, -0.7015601245, 0))):
        with BuildLine():
            ThreePointArc((0, 18.1948070409), (0.527864045, 20.4308750184), (2, 22.1948070409))
            Line((2, 22.1948070409), (1.94, 22.2748070409))
            ThreePointArc((1.94, 22.2748070409), (1, 22.2948070409), (0, 22.2948070409))
            Line((0, 22.2948070409), (-0.1, 22.1948070409))
            Line((-0.1, 22.1948070409), (-0.1, 18.1948070409))
            Line((-0.1, 18.1948070409), (0, 18.1948070409))
        make_face()
    extrude(amount=F3_T101_DEPTH)

    split(bisect_by=Plane(origin=(-20.2048091048, -9.1855946253, 0), x_dir=(0, 0, 1), z_dir=(0.9103394802, 0.4138623331, 0)), keep=Keep.TOP)


with BuildPart() as f3_tool95_1:
    add(f3_tool95.part)

    # F3_t103: intersect F3_tool99
    add(f3_tool99.part, mode=Mode.INTERSECT)


with BuildPart() as f1_17:
    add(f1_16.part)

    # F3_t93: cut F3_tool95
    add(f3_tool95_1.part, mode=Mode.SUBTRACT)


with BuildPart() as f3_tool106:
    # F3_s107 → F3_t108 (new body)
    with BuildSketch(Plane(origin=(-47.5690981419, 12.3485483386, 0), x_dir=(0, 0, 1), z_dir=(0.9679186559, -0.2512637569, 0))):
        with BuildLine():
            ThreePointArc((0, 18.1948070409), (0.527864045, 20.4308750184), (2, 22.1948070409))
            Line((2, 22.1948070409), (1.94, 22.2748070409))
            ThreePointArc((1.94, 22.2748070409), (1, 22.2948070409), (0, 22.2948070409))
            Line((0, 22.2948070409), (-0.1, 22.1948070409))
            Line((-0.1, 22.1948070409), (-0.1, 18.1948070409))
            Line((-0.1, 18.1948070409), (0, 18.1948070409))
        make_face()
    extrude(amount=F3_T108_DEPTH)

    split(bisect_by=Plane(origin=(-22.090675276, -2.147446258, 0), x_dir=(0, 0, 1), z_dir=(0.9953082825, 0.0967544459, 0)), keep=Keep.TOP)


with BuildPart() as f3_tool110:
    # F3_s111 → F3_t112 (new body)
    with BuildSketch(Plane(origin=(0.5331937761, -5.4849384583, 0), x_dir=(0, 0, 1), z_dir=(0.0967544459, -0.9953082825, 0))):
        with BuildLine():
            ThreePointArc((0, 18.1948070409), (0.527864045, 20.4308750184), (2, 22.1948070409))
            Line((2, 22.1948070409), (1.94, 22.2748070409))
            ThreePointArc((1.94, 22.2748070409), (1, 22.2948070409), (0, 22.2948070409))
            Line((0, 22.2948070409), (-0.1, 22.1948070409))
            Line((-0.1, 22.1948070409), (-0.1, 18.1948070409))
            Line((-0.1, 18.1948070409), (0, 18.1948070409))
        make_face()
    extrude(amount=F3_T112_DEPTH)

    split(bisect_by=Plane(origin=(-5.5767506003, -21.4827677994, 0), x_dir=(0, 0, 1), z_dir=(0.2512637569, 0.9679186559, 0)), keep=Keep.TOP)


with BuildPart() as f3_tool106_1:
    add(f3_tool106.part)

    # F3_t114: intersect F3_tool110
    add(f3_tool110.part, mode=Mode.INTERSECT)


with BuildPart() as f1_18:
    add(f1_17.part)

    # F3_t104: cut F3_tool106
    add(f3_tool106_1.part, mode=Mode.SUBTRACT)


with BuildPart() as f3_tool117:
    # F3_s118 → F3_t119 (new body)
    with BuildSketch(Plane(origin=(4.5981474874, -3.0374142256, 0), x_dir=(0, 0, 1), z_dir=(0.8343893579, -0.5511754706, 0))):
        with BuildLine():
            ThreePointArc((2, 22.1948070409), (0.527864045, 20.4308750184), (0, 18.1948070409))
            Line((0, 18.1948070409), (-0.1, 18.1948070409))
            Line((-0.1, 18.1948070409), (-0.1, 22.1948070409))
            Line((-0.1, 22.1948070409), (0, 22.2948070409))
            ThreePointArc((0, 22.2948070409), (1, 22.2948070409), (1.94, 22.2748070409))
            Line((1.94, 22.2748070409), (2, 22.1948070409))
        make_face()
    extrude(amount=F3_T119_DEPTH)

    split(bisect_by=Plane(origin=(13.1856833677, -17.8534930394, 0), x_dir=(0, 0, 1), z_dir=(-0.5940886687, 0.804399561, 0)), keep=Keep.TOP)


with BuildPart() as f3_tool121:
    # F3_s122 → F3_t123 (new body)
    with BuildSketch(Plane(origin=(-39.5328279158, -29.1969392418, 0), x_dir=(0, 0, 1), z_dir=(0.804399561, 0.5940886687, 0))):
        with BuildLine():
            ThreePointArc((2, 22.1948070409), (0.527864045, 20.4308750184), (0, 18.1948070409))
            Line((0, 18.1948070409), (-0.1, 18.1948070409))
            Line((-0.1, 18.1948070409), (-0.1, 22.1948070409))
            Line((-0.1, 22.1948070409), (0, 22.2948070409))
            ThreePointArc((0, 22.2948070409), (1, 22.2948070409), (1.94, 22.2748070409))
            Line((1.94, 22.2748070409), (2, 22.1948070409))
        make_face()
    extrude(amount=F3_T123_DEPTH)

    split(bisect_by=Plane(origin=(-12.2332332164, -18.5191107955, 0), x_dir=(0, 0, 1), z_dir=(0.5511754706, 0.8343893579, 0)), keep=Keep.TOP)


with BuildPart() as f3_tool117_1:
    add(f3_tool117.part)

    # F3_t125: intersect F3_tool121
    add(f3_tool121.part, mode=Mode.INTERSECT)


with BuildPart() as f1_19:
    add(f1_18.part)

    # F3_t115: cut F3_tool117
    add(f3_tool117_1.part, mode=Mode.SUBTRACT)


with BuildPart() as f3_tool128:
    # F3_s129 → F3_t130 (new body)
    with BuildSketch(Plane(origin=(-2.1885313046, -49.0970067808, 0), x_dir=(0, 0, 1), z_dir=(0.0445314366, 0.9990079835, 0))):
        with BuildLine():
            ThreePointArc((0, 18.1948070409), (0.527864045, 20.4308750184), (2, 22.1948070409))
            Line((2, 22.1948070409), (1.94, 22.2748070409))
            ThreePointArc((1.94, 22.2748070409), (1, 22.2948070409), (0, 22.2948070409))
            Line((0, 22.2948070409), (-0.1, 22.1948070409))
            Line((-0.1, 22.1948070409), (-0.1, 18.1948070409))
            Line((-0.1, 18.1948070409), (0, 18.1948070409))
        make_face()
    extrude(amount=F3_T130_DEPTH)

    split(bisect_by=Plane(origin=(6.6934290529, -21.1614618374, 0), x_dir=(0, 0, 1), z_dir=(-0.3015763571, 0.9534420281, 0)), keep=Keep.TOP)


with BuildPart() as f3_tool132:
    # F3_s133 → F3_t134 (new body)
    with BuildSketch(Plane(origin=(5.2542221736, 1.6619250417, 0), x_dir=(0, 0, 1), z_dir=(0.9534420281, 0.3015763571, 0))):
        with BuildLine():
            ThreePointArc((0, 18.1948070409), (0.527864045, 20.4308750184), (2, 22.1948070409))
            Line((2, 22.1948070409), (1.94, 22.2748070409))
            ThreePointArc((1.94, 22.2748070409), (1, 22.2948070409), (0, 22.2948070409))
            Line((0, 22.2948070409), (-0.1, 22.1948070409))
            Line((-0.1, 22.1948070409), (-0.1, 18.1948070409))
            Line((-0.1, 18.1948070409), (0, 18.1948070409))
        make_face()
    extrude(amount=F3_T134_DEPTH)

    split(bisect_by=Plane(origin=(22.1727894267, -0.9883666429, 0), x_dir=(0, 0, 1), z_dir=(-0.9990079835, 0.0445314366, 0)), keep=Keep.TOP)


with BuildPart() as f3_tool128_1:
    add(f3_tool128.part)

    # F3_t136: intersect F3_tool132
    add(f3_tool132.part, mode=Mode.INTERSECT)


with BuildPart() as f1_20:
    add(f1_19.part)

    # F3_t126: cut F3_tool128
    add(f3_tool128_1.part, mode=Mode.SUBTRACT)


with BuildPart() as f3_tool139:
    # F3_s140 → F3_t141 (new body)
    with BuildSketch(Plane(origin=(36.7782531622, -32.5985557719, 0), x_dir=(0, 0, 1), z_dir=(-0.7483504787, 0.663303521, 0))):
        with BuildLine():
            ThreePointArc((0, 18.1948070415), (0.527864045, 20.430875019), (2, 22.1948070415))
            Line((2, 22.1948070415), (1.94, 22.2748070415))
            ThreePointArc((1.94, 22.2748070415), (1, 22.2948070415), (0, 22.2948070415))
            Line((0, 22.2948070415), (-0.1, 22.1948070415))
            Line((-0.1, 22.1948070415), (-0.1, 18.1948070415))
            Line((-0.1, 18.1948070415), (0, 18.1948070415))
        make_face()
    extrude(amount=F3_T141_DEPTH)

    split(bisect_by=Plane(origin=(20.6578559964, -8.1155680787, 0), x_dir=(0, 0, 1), z_dir=(-0.9307517726, 0.3656516618, 0)), keep=Keep.TOP)


with BuildPart() as f3_tool143:
    # F3_s144 → F3_t145 (new body)
    with BuildSketch(Plane(origin=(2.0150308168, 5.1291808579, 0), x_dir=(0, 0, 1), z_dir=(0.3656516618, 0.9307517726, 0))):
        with BuildLine():
            ThreePointArc((0, 18.1948070415), (0.527864045, 20.430875019), (2, 22.1948070415))
            Line((2, 22.1948070415), (1.94, 22.2748070415))
            ThreePointArc((1.94, 22.2748070415), (1, 22.2948070415), (0, 22.2948070415))
            Line((0, 22.2948070415), (-0.1, 22.1948070415))
            Line((-0.1, 22.1948070415), (-0.1, 18.1948070415))
            Line((-0.1, 18.1948070415), (0, 18.1948070415))
        make_face()
    extrude(amount=F3_T145_DEPTH)

    split(bisect_by=Plane(origin=(14.7218936583, 16.6094944752, 0), x_dir=(0, 0, 1), z_dir=(-0.663303521, -0.7483504787, 0)), keep=Keep.TOP)


with BuildPart() as f3_tool139_1:
    add(f3_tool139.part)

    # F3_t147: intersect F3_tool143
    add(f3_tool143.part, mode=Mode.INTERSECT)


with BuildPart() as f1_21:
    add(f1_20.part)

    # F3_t137: cut F3_tool139
    add(f3_tool139_1.part, mode=Mode.SUBTRACT)


solid = f1_21.part
